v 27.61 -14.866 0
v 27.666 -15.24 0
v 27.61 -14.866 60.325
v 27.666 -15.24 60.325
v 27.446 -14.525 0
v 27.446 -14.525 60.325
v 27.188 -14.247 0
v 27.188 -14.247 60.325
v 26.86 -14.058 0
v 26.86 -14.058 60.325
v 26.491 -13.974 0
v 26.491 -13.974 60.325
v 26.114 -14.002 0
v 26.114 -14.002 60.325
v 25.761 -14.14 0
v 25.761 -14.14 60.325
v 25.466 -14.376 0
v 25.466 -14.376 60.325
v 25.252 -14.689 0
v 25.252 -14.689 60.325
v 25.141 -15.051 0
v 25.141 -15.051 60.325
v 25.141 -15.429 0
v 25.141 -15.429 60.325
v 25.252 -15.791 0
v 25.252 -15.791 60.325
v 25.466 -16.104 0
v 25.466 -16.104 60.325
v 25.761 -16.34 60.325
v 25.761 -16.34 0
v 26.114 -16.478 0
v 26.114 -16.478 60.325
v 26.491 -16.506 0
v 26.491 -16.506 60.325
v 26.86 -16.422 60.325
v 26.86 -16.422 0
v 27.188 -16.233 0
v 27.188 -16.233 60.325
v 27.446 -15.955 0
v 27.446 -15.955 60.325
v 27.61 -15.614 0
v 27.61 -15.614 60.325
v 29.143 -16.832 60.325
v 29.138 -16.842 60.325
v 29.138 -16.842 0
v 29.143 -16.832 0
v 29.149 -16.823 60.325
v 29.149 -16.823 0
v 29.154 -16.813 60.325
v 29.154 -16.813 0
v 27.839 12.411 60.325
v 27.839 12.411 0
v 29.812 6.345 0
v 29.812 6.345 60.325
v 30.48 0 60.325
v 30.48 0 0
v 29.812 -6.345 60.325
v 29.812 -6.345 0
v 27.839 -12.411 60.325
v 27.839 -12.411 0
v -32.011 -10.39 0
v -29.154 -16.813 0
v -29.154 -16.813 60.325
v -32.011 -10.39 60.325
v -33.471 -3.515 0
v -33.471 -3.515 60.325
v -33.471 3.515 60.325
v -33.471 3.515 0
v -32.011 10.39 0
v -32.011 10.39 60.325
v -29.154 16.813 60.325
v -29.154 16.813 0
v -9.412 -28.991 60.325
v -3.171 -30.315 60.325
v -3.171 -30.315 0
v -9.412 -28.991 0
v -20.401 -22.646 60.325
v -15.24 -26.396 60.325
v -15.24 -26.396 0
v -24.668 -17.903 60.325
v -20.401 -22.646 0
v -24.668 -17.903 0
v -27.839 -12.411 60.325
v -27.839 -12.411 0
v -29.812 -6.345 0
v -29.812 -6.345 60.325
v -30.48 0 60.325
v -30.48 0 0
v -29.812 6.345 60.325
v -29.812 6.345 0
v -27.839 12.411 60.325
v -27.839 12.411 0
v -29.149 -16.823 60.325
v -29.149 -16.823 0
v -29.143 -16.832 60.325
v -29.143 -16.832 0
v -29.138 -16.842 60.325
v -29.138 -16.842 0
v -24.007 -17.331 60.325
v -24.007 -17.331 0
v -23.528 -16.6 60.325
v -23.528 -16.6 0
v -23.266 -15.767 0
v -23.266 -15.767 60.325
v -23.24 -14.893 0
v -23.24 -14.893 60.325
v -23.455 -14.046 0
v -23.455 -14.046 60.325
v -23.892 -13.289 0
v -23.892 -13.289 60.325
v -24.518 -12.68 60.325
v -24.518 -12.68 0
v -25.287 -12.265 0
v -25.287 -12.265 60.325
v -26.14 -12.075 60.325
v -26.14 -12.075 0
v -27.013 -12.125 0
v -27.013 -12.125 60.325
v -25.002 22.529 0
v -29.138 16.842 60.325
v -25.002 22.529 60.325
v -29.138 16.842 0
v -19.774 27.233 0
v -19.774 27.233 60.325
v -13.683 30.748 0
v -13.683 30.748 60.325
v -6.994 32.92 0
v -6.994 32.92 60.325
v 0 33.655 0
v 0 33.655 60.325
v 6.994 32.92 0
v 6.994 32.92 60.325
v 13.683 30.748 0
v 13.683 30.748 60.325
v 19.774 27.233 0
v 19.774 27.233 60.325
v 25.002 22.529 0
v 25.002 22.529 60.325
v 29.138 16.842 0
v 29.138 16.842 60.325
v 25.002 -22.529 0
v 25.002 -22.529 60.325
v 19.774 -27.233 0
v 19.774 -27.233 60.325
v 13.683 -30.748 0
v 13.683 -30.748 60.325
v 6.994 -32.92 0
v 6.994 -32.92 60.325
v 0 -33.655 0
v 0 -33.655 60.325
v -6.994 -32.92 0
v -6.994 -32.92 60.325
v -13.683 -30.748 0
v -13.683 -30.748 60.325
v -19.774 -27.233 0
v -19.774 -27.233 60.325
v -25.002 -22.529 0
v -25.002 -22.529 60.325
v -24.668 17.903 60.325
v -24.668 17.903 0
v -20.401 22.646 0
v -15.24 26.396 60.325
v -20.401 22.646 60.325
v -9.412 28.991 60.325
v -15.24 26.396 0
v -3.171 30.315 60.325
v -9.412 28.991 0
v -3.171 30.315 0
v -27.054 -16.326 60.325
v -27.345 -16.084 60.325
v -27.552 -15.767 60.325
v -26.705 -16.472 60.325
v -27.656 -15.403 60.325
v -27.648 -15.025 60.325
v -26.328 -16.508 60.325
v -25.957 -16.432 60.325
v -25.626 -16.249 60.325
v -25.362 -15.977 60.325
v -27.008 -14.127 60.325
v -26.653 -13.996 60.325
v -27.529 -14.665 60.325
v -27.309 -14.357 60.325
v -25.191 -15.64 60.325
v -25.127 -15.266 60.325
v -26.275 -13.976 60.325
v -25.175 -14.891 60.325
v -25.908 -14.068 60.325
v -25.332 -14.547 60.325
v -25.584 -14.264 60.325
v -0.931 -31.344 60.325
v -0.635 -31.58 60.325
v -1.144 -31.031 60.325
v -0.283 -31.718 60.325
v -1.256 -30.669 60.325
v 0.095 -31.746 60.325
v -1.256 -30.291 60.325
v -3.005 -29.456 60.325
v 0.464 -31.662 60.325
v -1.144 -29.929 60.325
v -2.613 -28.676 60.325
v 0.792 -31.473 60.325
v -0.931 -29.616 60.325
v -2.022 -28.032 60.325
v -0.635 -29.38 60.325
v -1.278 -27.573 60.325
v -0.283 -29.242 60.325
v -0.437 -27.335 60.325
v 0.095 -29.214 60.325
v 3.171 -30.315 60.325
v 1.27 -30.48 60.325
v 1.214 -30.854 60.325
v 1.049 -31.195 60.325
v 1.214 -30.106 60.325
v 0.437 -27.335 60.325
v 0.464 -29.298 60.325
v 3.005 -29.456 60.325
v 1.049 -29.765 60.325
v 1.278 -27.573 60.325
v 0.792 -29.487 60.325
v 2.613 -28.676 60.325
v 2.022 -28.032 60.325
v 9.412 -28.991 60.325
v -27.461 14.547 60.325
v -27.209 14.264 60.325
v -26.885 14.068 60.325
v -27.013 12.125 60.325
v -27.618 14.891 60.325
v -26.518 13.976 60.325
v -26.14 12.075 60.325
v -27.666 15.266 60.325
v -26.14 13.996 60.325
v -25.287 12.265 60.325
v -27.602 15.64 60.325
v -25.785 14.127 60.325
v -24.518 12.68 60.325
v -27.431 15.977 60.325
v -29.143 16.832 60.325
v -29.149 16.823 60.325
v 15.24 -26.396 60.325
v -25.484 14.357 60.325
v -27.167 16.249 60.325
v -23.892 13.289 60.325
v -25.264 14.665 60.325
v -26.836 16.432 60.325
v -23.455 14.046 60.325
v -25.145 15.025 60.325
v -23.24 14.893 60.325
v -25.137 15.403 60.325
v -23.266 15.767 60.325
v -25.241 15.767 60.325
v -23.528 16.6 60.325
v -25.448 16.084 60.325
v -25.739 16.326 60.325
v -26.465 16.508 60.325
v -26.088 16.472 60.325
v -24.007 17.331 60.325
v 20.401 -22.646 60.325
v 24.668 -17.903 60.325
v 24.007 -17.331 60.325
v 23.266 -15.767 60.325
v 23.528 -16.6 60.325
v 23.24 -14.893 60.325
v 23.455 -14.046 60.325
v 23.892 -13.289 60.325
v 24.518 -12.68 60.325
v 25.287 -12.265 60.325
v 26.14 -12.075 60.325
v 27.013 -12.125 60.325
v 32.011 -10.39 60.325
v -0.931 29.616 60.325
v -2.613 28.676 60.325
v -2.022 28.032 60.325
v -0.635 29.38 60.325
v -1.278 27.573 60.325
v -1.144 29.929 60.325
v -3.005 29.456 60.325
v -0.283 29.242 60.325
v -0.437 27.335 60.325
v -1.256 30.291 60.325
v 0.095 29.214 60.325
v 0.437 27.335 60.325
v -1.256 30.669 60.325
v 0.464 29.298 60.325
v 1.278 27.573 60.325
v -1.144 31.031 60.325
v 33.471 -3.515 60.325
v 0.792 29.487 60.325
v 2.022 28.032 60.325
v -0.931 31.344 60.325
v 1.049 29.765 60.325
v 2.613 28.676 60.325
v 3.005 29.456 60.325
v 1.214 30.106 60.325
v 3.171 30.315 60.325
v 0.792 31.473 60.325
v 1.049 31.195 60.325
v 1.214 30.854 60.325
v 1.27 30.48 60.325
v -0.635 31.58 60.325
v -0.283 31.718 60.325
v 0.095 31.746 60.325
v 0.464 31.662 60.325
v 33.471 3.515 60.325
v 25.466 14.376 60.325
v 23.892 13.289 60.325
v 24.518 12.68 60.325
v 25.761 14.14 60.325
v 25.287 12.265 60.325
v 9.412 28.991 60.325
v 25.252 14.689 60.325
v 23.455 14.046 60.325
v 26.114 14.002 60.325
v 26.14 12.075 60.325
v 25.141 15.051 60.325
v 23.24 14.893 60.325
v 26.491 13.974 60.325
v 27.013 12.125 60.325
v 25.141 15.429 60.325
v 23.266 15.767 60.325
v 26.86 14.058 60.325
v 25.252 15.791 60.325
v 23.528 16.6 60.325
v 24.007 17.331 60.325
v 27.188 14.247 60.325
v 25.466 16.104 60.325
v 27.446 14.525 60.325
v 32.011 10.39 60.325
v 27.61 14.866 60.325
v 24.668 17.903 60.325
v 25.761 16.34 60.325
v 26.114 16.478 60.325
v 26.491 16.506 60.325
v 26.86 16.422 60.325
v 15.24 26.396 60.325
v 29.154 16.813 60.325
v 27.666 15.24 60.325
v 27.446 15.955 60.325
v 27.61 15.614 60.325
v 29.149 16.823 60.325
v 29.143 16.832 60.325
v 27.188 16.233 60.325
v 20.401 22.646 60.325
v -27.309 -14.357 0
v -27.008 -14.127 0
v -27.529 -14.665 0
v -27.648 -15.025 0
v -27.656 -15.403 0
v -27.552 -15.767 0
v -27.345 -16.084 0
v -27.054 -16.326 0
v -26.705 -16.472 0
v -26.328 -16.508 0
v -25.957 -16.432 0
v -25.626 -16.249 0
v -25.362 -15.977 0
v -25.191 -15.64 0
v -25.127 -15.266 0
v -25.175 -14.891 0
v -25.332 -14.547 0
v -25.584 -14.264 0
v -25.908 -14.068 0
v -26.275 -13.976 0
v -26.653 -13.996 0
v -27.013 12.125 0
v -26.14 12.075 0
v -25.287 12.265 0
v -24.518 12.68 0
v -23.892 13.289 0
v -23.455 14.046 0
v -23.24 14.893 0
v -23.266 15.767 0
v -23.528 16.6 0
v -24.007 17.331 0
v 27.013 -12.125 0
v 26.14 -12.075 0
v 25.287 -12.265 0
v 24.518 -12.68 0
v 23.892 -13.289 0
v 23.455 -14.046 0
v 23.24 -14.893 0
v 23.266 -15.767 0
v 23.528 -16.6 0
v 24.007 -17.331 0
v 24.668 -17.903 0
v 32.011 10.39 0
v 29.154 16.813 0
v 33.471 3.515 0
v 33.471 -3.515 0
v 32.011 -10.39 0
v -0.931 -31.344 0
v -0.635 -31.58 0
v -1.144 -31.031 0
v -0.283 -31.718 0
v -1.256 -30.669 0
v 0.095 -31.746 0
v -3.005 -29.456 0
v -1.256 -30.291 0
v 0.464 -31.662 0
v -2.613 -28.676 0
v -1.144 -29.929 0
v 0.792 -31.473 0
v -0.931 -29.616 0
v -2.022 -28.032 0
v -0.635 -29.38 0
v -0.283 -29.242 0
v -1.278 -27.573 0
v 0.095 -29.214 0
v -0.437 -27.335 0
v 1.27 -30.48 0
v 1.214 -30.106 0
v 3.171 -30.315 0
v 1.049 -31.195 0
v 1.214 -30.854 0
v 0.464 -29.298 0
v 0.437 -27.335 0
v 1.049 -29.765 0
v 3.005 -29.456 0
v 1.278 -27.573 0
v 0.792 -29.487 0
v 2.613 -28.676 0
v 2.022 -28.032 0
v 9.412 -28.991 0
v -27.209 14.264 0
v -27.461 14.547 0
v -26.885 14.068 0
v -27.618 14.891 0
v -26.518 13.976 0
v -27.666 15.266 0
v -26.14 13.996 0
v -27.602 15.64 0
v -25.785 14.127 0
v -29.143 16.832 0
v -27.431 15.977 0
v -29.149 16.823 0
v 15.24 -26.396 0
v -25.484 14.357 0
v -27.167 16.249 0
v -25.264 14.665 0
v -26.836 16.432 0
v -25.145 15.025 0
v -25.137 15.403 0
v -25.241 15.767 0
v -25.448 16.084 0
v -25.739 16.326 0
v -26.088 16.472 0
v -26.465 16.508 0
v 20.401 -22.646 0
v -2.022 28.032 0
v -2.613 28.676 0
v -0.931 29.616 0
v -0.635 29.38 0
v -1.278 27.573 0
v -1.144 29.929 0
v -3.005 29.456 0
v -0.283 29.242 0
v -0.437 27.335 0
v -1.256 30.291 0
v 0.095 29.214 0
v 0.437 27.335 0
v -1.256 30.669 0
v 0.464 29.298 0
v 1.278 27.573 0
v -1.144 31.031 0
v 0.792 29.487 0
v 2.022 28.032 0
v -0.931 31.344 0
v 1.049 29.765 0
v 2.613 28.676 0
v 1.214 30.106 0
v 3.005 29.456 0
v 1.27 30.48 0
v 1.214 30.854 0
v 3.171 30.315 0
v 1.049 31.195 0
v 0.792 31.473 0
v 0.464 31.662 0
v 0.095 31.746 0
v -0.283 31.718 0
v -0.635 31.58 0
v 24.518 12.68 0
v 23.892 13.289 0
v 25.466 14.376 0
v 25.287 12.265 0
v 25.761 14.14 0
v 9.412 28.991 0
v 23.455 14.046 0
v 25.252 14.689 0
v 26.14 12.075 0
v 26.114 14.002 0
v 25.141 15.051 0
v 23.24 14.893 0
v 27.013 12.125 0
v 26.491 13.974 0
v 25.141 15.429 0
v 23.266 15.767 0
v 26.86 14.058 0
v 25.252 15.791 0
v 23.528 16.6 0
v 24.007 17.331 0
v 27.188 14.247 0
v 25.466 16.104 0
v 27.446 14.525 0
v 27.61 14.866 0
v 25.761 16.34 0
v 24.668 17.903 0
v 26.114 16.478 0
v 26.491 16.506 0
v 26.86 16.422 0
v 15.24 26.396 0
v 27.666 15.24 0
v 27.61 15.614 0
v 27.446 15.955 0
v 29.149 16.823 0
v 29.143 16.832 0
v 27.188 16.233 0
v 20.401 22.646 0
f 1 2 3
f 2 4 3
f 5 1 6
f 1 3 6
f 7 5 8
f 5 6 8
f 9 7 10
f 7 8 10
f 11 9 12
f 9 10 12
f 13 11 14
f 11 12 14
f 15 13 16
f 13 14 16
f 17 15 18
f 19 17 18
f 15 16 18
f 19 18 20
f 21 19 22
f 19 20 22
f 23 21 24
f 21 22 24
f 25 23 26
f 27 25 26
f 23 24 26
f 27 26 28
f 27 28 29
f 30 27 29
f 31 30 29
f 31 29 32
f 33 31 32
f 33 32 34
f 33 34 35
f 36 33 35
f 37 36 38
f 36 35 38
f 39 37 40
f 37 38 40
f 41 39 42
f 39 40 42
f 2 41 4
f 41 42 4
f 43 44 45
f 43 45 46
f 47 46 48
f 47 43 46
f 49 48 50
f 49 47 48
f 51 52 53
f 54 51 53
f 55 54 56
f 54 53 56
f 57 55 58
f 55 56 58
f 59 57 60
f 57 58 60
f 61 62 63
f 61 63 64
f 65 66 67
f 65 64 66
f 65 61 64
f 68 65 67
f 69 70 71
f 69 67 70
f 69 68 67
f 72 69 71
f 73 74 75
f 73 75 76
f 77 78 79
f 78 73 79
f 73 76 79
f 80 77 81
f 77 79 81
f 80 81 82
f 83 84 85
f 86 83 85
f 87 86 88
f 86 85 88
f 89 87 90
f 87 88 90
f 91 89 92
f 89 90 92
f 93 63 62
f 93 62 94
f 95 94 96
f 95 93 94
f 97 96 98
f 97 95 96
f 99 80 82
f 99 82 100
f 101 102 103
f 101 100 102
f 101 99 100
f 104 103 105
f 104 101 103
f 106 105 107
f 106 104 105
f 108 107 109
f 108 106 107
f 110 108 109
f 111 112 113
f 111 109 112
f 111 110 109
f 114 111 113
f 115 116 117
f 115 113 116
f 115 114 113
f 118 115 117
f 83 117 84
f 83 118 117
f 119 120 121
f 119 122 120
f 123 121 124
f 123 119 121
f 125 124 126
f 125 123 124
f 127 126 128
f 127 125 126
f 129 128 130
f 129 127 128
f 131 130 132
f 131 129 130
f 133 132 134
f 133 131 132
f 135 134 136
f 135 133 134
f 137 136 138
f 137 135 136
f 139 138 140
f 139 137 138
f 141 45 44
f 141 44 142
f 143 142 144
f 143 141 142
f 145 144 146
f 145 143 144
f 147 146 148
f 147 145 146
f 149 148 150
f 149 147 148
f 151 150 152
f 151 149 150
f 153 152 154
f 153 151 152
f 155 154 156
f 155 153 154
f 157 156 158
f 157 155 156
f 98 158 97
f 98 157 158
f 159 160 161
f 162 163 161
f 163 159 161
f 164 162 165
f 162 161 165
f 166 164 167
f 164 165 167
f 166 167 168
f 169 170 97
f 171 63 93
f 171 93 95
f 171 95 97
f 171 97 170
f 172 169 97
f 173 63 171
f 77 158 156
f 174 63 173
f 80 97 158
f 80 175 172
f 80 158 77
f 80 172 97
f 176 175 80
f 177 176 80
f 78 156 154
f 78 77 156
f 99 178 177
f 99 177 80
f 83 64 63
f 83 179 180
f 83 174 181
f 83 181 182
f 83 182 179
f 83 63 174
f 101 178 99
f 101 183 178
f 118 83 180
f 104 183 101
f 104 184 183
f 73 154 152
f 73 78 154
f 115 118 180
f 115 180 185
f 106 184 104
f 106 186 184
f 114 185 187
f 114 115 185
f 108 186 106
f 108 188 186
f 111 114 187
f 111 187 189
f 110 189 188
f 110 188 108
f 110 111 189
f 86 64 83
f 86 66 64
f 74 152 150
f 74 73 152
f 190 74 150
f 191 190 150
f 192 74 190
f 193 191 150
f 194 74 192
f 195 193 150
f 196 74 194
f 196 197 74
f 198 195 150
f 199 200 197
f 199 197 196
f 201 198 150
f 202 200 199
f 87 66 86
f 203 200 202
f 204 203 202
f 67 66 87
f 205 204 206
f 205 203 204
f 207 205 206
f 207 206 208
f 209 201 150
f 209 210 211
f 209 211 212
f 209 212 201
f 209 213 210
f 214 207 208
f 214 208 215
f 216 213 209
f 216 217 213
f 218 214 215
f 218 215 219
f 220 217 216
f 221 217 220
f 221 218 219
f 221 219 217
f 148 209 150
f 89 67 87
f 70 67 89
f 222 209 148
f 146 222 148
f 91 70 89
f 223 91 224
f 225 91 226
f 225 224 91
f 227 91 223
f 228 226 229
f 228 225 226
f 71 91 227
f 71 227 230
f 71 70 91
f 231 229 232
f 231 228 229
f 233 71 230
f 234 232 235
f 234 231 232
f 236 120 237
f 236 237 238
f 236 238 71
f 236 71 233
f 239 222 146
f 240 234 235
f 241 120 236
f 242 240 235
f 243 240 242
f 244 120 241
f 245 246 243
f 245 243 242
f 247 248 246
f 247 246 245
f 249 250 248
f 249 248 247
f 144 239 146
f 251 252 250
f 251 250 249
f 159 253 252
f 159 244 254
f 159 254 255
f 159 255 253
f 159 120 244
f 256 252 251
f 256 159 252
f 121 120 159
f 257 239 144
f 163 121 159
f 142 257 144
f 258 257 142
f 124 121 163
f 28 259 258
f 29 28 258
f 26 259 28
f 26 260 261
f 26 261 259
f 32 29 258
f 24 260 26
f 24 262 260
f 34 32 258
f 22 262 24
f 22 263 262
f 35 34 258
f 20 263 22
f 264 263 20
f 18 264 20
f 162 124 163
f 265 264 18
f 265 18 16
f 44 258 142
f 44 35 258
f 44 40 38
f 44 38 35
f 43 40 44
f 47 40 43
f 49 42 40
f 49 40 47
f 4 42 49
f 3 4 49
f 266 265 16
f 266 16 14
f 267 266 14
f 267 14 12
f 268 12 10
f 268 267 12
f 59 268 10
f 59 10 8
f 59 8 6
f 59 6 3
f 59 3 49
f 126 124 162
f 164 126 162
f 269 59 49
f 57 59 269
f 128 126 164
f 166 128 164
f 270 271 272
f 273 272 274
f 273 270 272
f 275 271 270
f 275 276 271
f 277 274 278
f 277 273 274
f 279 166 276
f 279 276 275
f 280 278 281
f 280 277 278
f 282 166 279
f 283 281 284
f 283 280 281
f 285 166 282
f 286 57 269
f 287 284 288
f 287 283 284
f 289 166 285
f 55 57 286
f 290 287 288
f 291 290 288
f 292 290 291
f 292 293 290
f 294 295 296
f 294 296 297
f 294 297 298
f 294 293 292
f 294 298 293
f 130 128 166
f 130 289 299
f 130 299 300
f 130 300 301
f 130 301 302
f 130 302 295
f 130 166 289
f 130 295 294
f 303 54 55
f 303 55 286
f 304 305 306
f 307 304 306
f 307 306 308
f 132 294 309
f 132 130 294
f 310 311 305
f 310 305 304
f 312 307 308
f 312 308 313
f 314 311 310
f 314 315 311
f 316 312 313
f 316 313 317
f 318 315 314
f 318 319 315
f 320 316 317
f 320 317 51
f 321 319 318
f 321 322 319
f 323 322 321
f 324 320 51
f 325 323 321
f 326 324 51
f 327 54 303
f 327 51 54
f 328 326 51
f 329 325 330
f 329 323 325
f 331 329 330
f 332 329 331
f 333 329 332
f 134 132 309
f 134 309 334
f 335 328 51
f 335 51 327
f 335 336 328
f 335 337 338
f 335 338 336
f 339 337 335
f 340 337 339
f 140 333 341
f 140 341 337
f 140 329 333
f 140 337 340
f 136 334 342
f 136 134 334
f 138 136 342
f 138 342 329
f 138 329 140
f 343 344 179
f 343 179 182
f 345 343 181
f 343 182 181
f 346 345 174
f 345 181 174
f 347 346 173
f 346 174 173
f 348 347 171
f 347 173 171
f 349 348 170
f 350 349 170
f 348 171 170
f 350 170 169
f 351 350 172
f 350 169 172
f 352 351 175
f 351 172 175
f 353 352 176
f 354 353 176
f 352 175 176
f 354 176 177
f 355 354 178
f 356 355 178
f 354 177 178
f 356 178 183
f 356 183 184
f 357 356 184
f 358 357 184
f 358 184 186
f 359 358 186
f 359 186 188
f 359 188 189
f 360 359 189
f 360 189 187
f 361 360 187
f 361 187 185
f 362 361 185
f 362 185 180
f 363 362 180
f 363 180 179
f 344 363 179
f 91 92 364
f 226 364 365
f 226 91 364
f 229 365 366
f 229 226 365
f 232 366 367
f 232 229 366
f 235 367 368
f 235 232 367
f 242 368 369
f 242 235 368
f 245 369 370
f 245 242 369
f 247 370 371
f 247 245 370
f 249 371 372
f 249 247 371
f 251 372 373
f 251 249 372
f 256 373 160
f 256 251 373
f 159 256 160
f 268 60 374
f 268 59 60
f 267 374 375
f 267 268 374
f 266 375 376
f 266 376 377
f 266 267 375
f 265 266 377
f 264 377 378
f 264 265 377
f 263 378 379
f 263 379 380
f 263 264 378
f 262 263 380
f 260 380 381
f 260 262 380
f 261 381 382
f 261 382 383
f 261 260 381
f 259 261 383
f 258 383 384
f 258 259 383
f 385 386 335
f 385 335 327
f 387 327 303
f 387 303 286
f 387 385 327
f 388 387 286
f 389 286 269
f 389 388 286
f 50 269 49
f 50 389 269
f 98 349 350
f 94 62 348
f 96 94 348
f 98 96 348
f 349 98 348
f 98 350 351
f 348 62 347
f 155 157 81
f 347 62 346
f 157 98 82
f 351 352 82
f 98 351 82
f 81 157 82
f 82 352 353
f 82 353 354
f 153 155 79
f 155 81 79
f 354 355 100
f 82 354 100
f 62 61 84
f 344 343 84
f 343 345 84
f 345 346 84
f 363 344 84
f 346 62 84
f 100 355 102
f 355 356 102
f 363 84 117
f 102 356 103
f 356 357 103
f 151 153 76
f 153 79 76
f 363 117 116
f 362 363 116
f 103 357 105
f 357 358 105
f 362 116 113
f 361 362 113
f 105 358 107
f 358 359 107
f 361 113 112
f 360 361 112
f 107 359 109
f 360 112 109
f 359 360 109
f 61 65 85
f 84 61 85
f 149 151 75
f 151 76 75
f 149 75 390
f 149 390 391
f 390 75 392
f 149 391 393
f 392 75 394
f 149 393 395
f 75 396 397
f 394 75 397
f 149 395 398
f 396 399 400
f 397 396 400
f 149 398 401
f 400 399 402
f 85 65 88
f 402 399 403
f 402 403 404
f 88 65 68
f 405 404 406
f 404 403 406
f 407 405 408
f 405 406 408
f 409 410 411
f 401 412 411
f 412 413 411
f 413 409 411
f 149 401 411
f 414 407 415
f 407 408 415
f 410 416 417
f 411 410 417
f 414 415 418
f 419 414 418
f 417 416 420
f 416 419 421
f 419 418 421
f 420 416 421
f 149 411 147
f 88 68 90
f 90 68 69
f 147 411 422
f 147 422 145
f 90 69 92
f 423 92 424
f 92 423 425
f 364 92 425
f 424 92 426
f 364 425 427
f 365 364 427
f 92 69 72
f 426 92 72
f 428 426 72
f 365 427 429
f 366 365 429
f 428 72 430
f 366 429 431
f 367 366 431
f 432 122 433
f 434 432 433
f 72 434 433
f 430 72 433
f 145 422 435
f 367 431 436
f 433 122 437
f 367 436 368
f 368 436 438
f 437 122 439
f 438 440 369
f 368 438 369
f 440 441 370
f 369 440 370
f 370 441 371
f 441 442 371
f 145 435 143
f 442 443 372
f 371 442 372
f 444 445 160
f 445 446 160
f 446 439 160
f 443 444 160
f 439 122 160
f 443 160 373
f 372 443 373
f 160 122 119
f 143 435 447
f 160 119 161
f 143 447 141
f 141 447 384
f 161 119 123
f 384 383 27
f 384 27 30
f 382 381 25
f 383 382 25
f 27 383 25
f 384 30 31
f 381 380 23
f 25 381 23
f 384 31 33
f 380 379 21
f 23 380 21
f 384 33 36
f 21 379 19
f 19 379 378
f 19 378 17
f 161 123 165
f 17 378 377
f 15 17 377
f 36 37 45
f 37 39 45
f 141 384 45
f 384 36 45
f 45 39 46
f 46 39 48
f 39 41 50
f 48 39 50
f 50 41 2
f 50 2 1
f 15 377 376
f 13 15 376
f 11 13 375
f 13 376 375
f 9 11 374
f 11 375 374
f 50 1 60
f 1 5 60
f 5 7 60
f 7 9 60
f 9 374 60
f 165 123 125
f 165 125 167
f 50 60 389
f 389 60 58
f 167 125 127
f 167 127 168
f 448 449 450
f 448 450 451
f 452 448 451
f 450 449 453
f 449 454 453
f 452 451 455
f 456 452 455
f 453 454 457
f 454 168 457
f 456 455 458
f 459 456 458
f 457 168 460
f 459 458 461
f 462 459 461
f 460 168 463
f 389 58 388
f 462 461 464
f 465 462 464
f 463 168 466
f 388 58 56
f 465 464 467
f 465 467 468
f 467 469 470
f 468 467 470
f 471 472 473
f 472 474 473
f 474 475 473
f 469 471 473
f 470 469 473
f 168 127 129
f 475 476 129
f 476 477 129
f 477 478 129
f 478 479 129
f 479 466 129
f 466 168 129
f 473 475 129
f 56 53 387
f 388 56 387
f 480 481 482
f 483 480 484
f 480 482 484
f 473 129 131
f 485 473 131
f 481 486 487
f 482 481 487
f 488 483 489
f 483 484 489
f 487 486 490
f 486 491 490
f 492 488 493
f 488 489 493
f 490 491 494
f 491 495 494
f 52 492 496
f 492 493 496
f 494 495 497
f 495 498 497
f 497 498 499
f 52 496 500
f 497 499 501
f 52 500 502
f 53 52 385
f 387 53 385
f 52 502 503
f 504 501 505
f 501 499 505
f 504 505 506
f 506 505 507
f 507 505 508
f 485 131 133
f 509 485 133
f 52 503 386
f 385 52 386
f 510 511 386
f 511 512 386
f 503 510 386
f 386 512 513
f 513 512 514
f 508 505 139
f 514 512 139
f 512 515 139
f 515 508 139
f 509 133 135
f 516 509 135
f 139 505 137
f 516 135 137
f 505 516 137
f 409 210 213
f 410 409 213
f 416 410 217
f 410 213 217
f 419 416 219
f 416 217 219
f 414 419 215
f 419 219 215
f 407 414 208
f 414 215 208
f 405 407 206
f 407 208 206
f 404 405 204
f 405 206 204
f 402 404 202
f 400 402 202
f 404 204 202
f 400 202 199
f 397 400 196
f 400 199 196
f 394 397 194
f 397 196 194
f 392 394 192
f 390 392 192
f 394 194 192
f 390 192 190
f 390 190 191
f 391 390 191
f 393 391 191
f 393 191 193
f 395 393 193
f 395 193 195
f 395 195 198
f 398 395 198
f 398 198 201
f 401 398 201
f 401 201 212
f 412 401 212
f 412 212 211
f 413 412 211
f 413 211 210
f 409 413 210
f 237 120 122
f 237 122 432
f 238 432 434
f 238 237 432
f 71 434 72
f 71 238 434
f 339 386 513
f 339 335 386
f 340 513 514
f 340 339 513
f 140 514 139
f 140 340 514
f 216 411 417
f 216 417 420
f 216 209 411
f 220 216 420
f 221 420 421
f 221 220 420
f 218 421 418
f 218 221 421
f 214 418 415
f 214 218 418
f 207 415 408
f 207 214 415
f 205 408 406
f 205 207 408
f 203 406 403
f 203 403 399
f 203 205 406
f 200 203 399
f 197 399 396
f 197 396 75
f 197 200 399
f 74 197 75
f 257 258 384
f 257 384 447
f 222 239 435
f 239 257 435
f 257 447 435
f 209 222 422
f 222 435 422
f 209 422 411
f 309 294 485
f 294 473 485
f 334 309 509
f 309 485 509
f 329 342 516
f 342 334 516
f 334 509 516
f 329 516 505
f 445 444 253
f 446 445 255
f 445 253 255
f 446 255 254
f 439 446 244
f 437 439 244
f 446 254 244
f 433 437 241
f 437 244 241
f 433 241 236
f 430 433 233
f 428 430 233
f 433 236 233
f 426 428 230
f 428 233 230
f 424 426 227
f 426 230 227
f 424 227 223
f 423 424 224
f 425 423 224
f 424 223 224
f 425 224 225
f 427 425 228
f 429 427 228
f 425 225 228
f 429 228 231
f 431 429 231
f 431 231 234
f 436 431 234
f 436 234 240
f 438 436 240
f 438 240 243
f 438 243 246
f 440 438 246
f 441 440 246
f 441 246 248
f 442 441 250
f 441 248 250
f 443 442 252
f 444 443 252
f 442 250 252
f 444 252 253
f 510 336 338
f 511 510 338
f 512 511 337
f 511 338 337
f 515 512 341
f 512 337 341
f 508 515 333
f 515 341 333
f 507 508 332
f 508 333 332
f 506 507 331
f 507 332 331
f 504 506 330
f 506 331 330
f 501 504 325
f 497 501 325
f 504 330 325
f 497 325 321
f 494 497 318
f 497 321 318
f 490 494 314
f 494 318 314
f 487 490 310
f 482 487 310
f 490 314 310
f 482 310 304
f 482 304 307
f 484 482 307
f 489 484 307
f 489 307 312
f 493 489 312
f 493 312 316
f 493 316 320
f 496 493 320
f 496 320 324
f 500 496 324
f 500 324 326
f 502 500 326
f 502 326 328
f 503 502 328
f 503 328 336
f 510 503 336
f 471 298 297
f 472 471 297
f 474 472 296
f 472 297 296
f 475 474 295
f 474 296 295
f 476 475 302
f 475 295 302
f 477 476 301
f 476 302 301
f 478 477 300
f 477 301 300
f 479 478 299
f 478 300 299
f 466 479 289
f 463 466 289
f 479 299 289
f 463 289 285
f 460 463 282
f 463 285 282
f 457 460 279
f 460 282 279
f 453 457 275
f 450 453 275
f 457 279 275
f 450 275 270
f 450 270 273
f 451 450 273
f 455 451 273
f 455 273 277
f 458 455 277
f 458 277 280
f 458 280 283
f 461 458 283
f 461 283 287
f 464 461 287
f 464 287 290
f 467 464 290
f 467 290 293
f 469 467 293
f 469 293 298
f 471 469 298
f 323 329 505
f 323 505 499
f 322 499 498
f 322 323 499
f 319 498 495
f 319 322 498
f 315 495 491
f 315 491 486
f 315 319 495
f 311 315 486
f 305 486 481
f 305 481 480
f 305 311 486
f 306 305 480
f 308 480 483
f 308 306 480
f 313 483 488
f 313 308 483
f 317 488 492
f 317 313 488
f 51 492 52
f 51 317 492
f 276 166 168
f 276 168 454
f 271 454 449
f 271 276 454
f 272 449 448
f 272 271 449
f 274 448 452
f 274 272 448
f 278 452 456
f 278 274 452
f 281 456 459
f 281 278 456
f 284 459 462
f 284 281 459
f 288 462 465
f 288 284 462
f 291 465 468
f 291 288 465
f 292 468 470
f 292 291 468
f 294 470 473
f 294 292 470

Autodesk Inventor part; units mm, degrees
ref_plane "YZ Plane" through (0, 0, 0) normal (1, 0, 0) x (0, 1, 0)
ref_plane "XZ Plane" through (0, 0, 0) normal (0, 1, 0) x (-1, 0, 0)
ref_plane "XY Plane" through (0, 0, 0) normal (0, 0, 1) x (1, 0, 0)
sketch "Sketch1" plane through (0, 0, 0) normal (0, 0, 1) x (1, 0, 0)
  circle A0 centre (0, 0) radius 33.655
  circle A1 centre (0, 0) radius 30.48
  dimension "d0" = 67.31
  dimension "d1" = 60.96
extrude "Extrusion1" add sketch "Sketch1" along normal blind 60.325
sketch "Sketch3" plane through (0, 0, 60.325) normal (0, 0, 1) x (1, 0, 0)
  line L0 (0, 0) -> (0, 30.48)
  circle A0 centre (0, 30.48) radius 1.27
  circle A1 centre (0, 30.48) radius 3.175
  circle A2 centre (-26.3965, 15.24) radius 3.175
  circle A3 centre (-26.3965, 15.24) radius 1.27
  circle A4 centre (-26.3965, -15.24) radius 3.175
  circle A5 centre (-26.3965, -15.24) radius 1.27
  circle A6 centre (0, -30.48) radius 3.175
  circle A7 centre (0, -30.48) radius 1.27
  circle A8 centre (26.3965, -15.24) radius 3.175
  circle A9 centre (26.3965, -15.24) radius 1.27
  circle A10 centre (26.3965, 15.24) radius 3.175
  circle A11 centre (26.3965, 15.24) radius 1.27
  dimension "d4" = 30.48
  dimension "d5" = 2.54
  dimension "d6" = 6.35
  dimension "d9" = 360
extrude "Extrusion2" add sketch "Sketch3" against normal up to surface (60.325 mm away)
extrude "Extrusion3" cut sketch "Sketch3" against normal up to surface (60.325 mm away) contours A0 | A3 | A5 | A7 | A9 | A11
properties part number "Spool" material "ABS Plastic"
